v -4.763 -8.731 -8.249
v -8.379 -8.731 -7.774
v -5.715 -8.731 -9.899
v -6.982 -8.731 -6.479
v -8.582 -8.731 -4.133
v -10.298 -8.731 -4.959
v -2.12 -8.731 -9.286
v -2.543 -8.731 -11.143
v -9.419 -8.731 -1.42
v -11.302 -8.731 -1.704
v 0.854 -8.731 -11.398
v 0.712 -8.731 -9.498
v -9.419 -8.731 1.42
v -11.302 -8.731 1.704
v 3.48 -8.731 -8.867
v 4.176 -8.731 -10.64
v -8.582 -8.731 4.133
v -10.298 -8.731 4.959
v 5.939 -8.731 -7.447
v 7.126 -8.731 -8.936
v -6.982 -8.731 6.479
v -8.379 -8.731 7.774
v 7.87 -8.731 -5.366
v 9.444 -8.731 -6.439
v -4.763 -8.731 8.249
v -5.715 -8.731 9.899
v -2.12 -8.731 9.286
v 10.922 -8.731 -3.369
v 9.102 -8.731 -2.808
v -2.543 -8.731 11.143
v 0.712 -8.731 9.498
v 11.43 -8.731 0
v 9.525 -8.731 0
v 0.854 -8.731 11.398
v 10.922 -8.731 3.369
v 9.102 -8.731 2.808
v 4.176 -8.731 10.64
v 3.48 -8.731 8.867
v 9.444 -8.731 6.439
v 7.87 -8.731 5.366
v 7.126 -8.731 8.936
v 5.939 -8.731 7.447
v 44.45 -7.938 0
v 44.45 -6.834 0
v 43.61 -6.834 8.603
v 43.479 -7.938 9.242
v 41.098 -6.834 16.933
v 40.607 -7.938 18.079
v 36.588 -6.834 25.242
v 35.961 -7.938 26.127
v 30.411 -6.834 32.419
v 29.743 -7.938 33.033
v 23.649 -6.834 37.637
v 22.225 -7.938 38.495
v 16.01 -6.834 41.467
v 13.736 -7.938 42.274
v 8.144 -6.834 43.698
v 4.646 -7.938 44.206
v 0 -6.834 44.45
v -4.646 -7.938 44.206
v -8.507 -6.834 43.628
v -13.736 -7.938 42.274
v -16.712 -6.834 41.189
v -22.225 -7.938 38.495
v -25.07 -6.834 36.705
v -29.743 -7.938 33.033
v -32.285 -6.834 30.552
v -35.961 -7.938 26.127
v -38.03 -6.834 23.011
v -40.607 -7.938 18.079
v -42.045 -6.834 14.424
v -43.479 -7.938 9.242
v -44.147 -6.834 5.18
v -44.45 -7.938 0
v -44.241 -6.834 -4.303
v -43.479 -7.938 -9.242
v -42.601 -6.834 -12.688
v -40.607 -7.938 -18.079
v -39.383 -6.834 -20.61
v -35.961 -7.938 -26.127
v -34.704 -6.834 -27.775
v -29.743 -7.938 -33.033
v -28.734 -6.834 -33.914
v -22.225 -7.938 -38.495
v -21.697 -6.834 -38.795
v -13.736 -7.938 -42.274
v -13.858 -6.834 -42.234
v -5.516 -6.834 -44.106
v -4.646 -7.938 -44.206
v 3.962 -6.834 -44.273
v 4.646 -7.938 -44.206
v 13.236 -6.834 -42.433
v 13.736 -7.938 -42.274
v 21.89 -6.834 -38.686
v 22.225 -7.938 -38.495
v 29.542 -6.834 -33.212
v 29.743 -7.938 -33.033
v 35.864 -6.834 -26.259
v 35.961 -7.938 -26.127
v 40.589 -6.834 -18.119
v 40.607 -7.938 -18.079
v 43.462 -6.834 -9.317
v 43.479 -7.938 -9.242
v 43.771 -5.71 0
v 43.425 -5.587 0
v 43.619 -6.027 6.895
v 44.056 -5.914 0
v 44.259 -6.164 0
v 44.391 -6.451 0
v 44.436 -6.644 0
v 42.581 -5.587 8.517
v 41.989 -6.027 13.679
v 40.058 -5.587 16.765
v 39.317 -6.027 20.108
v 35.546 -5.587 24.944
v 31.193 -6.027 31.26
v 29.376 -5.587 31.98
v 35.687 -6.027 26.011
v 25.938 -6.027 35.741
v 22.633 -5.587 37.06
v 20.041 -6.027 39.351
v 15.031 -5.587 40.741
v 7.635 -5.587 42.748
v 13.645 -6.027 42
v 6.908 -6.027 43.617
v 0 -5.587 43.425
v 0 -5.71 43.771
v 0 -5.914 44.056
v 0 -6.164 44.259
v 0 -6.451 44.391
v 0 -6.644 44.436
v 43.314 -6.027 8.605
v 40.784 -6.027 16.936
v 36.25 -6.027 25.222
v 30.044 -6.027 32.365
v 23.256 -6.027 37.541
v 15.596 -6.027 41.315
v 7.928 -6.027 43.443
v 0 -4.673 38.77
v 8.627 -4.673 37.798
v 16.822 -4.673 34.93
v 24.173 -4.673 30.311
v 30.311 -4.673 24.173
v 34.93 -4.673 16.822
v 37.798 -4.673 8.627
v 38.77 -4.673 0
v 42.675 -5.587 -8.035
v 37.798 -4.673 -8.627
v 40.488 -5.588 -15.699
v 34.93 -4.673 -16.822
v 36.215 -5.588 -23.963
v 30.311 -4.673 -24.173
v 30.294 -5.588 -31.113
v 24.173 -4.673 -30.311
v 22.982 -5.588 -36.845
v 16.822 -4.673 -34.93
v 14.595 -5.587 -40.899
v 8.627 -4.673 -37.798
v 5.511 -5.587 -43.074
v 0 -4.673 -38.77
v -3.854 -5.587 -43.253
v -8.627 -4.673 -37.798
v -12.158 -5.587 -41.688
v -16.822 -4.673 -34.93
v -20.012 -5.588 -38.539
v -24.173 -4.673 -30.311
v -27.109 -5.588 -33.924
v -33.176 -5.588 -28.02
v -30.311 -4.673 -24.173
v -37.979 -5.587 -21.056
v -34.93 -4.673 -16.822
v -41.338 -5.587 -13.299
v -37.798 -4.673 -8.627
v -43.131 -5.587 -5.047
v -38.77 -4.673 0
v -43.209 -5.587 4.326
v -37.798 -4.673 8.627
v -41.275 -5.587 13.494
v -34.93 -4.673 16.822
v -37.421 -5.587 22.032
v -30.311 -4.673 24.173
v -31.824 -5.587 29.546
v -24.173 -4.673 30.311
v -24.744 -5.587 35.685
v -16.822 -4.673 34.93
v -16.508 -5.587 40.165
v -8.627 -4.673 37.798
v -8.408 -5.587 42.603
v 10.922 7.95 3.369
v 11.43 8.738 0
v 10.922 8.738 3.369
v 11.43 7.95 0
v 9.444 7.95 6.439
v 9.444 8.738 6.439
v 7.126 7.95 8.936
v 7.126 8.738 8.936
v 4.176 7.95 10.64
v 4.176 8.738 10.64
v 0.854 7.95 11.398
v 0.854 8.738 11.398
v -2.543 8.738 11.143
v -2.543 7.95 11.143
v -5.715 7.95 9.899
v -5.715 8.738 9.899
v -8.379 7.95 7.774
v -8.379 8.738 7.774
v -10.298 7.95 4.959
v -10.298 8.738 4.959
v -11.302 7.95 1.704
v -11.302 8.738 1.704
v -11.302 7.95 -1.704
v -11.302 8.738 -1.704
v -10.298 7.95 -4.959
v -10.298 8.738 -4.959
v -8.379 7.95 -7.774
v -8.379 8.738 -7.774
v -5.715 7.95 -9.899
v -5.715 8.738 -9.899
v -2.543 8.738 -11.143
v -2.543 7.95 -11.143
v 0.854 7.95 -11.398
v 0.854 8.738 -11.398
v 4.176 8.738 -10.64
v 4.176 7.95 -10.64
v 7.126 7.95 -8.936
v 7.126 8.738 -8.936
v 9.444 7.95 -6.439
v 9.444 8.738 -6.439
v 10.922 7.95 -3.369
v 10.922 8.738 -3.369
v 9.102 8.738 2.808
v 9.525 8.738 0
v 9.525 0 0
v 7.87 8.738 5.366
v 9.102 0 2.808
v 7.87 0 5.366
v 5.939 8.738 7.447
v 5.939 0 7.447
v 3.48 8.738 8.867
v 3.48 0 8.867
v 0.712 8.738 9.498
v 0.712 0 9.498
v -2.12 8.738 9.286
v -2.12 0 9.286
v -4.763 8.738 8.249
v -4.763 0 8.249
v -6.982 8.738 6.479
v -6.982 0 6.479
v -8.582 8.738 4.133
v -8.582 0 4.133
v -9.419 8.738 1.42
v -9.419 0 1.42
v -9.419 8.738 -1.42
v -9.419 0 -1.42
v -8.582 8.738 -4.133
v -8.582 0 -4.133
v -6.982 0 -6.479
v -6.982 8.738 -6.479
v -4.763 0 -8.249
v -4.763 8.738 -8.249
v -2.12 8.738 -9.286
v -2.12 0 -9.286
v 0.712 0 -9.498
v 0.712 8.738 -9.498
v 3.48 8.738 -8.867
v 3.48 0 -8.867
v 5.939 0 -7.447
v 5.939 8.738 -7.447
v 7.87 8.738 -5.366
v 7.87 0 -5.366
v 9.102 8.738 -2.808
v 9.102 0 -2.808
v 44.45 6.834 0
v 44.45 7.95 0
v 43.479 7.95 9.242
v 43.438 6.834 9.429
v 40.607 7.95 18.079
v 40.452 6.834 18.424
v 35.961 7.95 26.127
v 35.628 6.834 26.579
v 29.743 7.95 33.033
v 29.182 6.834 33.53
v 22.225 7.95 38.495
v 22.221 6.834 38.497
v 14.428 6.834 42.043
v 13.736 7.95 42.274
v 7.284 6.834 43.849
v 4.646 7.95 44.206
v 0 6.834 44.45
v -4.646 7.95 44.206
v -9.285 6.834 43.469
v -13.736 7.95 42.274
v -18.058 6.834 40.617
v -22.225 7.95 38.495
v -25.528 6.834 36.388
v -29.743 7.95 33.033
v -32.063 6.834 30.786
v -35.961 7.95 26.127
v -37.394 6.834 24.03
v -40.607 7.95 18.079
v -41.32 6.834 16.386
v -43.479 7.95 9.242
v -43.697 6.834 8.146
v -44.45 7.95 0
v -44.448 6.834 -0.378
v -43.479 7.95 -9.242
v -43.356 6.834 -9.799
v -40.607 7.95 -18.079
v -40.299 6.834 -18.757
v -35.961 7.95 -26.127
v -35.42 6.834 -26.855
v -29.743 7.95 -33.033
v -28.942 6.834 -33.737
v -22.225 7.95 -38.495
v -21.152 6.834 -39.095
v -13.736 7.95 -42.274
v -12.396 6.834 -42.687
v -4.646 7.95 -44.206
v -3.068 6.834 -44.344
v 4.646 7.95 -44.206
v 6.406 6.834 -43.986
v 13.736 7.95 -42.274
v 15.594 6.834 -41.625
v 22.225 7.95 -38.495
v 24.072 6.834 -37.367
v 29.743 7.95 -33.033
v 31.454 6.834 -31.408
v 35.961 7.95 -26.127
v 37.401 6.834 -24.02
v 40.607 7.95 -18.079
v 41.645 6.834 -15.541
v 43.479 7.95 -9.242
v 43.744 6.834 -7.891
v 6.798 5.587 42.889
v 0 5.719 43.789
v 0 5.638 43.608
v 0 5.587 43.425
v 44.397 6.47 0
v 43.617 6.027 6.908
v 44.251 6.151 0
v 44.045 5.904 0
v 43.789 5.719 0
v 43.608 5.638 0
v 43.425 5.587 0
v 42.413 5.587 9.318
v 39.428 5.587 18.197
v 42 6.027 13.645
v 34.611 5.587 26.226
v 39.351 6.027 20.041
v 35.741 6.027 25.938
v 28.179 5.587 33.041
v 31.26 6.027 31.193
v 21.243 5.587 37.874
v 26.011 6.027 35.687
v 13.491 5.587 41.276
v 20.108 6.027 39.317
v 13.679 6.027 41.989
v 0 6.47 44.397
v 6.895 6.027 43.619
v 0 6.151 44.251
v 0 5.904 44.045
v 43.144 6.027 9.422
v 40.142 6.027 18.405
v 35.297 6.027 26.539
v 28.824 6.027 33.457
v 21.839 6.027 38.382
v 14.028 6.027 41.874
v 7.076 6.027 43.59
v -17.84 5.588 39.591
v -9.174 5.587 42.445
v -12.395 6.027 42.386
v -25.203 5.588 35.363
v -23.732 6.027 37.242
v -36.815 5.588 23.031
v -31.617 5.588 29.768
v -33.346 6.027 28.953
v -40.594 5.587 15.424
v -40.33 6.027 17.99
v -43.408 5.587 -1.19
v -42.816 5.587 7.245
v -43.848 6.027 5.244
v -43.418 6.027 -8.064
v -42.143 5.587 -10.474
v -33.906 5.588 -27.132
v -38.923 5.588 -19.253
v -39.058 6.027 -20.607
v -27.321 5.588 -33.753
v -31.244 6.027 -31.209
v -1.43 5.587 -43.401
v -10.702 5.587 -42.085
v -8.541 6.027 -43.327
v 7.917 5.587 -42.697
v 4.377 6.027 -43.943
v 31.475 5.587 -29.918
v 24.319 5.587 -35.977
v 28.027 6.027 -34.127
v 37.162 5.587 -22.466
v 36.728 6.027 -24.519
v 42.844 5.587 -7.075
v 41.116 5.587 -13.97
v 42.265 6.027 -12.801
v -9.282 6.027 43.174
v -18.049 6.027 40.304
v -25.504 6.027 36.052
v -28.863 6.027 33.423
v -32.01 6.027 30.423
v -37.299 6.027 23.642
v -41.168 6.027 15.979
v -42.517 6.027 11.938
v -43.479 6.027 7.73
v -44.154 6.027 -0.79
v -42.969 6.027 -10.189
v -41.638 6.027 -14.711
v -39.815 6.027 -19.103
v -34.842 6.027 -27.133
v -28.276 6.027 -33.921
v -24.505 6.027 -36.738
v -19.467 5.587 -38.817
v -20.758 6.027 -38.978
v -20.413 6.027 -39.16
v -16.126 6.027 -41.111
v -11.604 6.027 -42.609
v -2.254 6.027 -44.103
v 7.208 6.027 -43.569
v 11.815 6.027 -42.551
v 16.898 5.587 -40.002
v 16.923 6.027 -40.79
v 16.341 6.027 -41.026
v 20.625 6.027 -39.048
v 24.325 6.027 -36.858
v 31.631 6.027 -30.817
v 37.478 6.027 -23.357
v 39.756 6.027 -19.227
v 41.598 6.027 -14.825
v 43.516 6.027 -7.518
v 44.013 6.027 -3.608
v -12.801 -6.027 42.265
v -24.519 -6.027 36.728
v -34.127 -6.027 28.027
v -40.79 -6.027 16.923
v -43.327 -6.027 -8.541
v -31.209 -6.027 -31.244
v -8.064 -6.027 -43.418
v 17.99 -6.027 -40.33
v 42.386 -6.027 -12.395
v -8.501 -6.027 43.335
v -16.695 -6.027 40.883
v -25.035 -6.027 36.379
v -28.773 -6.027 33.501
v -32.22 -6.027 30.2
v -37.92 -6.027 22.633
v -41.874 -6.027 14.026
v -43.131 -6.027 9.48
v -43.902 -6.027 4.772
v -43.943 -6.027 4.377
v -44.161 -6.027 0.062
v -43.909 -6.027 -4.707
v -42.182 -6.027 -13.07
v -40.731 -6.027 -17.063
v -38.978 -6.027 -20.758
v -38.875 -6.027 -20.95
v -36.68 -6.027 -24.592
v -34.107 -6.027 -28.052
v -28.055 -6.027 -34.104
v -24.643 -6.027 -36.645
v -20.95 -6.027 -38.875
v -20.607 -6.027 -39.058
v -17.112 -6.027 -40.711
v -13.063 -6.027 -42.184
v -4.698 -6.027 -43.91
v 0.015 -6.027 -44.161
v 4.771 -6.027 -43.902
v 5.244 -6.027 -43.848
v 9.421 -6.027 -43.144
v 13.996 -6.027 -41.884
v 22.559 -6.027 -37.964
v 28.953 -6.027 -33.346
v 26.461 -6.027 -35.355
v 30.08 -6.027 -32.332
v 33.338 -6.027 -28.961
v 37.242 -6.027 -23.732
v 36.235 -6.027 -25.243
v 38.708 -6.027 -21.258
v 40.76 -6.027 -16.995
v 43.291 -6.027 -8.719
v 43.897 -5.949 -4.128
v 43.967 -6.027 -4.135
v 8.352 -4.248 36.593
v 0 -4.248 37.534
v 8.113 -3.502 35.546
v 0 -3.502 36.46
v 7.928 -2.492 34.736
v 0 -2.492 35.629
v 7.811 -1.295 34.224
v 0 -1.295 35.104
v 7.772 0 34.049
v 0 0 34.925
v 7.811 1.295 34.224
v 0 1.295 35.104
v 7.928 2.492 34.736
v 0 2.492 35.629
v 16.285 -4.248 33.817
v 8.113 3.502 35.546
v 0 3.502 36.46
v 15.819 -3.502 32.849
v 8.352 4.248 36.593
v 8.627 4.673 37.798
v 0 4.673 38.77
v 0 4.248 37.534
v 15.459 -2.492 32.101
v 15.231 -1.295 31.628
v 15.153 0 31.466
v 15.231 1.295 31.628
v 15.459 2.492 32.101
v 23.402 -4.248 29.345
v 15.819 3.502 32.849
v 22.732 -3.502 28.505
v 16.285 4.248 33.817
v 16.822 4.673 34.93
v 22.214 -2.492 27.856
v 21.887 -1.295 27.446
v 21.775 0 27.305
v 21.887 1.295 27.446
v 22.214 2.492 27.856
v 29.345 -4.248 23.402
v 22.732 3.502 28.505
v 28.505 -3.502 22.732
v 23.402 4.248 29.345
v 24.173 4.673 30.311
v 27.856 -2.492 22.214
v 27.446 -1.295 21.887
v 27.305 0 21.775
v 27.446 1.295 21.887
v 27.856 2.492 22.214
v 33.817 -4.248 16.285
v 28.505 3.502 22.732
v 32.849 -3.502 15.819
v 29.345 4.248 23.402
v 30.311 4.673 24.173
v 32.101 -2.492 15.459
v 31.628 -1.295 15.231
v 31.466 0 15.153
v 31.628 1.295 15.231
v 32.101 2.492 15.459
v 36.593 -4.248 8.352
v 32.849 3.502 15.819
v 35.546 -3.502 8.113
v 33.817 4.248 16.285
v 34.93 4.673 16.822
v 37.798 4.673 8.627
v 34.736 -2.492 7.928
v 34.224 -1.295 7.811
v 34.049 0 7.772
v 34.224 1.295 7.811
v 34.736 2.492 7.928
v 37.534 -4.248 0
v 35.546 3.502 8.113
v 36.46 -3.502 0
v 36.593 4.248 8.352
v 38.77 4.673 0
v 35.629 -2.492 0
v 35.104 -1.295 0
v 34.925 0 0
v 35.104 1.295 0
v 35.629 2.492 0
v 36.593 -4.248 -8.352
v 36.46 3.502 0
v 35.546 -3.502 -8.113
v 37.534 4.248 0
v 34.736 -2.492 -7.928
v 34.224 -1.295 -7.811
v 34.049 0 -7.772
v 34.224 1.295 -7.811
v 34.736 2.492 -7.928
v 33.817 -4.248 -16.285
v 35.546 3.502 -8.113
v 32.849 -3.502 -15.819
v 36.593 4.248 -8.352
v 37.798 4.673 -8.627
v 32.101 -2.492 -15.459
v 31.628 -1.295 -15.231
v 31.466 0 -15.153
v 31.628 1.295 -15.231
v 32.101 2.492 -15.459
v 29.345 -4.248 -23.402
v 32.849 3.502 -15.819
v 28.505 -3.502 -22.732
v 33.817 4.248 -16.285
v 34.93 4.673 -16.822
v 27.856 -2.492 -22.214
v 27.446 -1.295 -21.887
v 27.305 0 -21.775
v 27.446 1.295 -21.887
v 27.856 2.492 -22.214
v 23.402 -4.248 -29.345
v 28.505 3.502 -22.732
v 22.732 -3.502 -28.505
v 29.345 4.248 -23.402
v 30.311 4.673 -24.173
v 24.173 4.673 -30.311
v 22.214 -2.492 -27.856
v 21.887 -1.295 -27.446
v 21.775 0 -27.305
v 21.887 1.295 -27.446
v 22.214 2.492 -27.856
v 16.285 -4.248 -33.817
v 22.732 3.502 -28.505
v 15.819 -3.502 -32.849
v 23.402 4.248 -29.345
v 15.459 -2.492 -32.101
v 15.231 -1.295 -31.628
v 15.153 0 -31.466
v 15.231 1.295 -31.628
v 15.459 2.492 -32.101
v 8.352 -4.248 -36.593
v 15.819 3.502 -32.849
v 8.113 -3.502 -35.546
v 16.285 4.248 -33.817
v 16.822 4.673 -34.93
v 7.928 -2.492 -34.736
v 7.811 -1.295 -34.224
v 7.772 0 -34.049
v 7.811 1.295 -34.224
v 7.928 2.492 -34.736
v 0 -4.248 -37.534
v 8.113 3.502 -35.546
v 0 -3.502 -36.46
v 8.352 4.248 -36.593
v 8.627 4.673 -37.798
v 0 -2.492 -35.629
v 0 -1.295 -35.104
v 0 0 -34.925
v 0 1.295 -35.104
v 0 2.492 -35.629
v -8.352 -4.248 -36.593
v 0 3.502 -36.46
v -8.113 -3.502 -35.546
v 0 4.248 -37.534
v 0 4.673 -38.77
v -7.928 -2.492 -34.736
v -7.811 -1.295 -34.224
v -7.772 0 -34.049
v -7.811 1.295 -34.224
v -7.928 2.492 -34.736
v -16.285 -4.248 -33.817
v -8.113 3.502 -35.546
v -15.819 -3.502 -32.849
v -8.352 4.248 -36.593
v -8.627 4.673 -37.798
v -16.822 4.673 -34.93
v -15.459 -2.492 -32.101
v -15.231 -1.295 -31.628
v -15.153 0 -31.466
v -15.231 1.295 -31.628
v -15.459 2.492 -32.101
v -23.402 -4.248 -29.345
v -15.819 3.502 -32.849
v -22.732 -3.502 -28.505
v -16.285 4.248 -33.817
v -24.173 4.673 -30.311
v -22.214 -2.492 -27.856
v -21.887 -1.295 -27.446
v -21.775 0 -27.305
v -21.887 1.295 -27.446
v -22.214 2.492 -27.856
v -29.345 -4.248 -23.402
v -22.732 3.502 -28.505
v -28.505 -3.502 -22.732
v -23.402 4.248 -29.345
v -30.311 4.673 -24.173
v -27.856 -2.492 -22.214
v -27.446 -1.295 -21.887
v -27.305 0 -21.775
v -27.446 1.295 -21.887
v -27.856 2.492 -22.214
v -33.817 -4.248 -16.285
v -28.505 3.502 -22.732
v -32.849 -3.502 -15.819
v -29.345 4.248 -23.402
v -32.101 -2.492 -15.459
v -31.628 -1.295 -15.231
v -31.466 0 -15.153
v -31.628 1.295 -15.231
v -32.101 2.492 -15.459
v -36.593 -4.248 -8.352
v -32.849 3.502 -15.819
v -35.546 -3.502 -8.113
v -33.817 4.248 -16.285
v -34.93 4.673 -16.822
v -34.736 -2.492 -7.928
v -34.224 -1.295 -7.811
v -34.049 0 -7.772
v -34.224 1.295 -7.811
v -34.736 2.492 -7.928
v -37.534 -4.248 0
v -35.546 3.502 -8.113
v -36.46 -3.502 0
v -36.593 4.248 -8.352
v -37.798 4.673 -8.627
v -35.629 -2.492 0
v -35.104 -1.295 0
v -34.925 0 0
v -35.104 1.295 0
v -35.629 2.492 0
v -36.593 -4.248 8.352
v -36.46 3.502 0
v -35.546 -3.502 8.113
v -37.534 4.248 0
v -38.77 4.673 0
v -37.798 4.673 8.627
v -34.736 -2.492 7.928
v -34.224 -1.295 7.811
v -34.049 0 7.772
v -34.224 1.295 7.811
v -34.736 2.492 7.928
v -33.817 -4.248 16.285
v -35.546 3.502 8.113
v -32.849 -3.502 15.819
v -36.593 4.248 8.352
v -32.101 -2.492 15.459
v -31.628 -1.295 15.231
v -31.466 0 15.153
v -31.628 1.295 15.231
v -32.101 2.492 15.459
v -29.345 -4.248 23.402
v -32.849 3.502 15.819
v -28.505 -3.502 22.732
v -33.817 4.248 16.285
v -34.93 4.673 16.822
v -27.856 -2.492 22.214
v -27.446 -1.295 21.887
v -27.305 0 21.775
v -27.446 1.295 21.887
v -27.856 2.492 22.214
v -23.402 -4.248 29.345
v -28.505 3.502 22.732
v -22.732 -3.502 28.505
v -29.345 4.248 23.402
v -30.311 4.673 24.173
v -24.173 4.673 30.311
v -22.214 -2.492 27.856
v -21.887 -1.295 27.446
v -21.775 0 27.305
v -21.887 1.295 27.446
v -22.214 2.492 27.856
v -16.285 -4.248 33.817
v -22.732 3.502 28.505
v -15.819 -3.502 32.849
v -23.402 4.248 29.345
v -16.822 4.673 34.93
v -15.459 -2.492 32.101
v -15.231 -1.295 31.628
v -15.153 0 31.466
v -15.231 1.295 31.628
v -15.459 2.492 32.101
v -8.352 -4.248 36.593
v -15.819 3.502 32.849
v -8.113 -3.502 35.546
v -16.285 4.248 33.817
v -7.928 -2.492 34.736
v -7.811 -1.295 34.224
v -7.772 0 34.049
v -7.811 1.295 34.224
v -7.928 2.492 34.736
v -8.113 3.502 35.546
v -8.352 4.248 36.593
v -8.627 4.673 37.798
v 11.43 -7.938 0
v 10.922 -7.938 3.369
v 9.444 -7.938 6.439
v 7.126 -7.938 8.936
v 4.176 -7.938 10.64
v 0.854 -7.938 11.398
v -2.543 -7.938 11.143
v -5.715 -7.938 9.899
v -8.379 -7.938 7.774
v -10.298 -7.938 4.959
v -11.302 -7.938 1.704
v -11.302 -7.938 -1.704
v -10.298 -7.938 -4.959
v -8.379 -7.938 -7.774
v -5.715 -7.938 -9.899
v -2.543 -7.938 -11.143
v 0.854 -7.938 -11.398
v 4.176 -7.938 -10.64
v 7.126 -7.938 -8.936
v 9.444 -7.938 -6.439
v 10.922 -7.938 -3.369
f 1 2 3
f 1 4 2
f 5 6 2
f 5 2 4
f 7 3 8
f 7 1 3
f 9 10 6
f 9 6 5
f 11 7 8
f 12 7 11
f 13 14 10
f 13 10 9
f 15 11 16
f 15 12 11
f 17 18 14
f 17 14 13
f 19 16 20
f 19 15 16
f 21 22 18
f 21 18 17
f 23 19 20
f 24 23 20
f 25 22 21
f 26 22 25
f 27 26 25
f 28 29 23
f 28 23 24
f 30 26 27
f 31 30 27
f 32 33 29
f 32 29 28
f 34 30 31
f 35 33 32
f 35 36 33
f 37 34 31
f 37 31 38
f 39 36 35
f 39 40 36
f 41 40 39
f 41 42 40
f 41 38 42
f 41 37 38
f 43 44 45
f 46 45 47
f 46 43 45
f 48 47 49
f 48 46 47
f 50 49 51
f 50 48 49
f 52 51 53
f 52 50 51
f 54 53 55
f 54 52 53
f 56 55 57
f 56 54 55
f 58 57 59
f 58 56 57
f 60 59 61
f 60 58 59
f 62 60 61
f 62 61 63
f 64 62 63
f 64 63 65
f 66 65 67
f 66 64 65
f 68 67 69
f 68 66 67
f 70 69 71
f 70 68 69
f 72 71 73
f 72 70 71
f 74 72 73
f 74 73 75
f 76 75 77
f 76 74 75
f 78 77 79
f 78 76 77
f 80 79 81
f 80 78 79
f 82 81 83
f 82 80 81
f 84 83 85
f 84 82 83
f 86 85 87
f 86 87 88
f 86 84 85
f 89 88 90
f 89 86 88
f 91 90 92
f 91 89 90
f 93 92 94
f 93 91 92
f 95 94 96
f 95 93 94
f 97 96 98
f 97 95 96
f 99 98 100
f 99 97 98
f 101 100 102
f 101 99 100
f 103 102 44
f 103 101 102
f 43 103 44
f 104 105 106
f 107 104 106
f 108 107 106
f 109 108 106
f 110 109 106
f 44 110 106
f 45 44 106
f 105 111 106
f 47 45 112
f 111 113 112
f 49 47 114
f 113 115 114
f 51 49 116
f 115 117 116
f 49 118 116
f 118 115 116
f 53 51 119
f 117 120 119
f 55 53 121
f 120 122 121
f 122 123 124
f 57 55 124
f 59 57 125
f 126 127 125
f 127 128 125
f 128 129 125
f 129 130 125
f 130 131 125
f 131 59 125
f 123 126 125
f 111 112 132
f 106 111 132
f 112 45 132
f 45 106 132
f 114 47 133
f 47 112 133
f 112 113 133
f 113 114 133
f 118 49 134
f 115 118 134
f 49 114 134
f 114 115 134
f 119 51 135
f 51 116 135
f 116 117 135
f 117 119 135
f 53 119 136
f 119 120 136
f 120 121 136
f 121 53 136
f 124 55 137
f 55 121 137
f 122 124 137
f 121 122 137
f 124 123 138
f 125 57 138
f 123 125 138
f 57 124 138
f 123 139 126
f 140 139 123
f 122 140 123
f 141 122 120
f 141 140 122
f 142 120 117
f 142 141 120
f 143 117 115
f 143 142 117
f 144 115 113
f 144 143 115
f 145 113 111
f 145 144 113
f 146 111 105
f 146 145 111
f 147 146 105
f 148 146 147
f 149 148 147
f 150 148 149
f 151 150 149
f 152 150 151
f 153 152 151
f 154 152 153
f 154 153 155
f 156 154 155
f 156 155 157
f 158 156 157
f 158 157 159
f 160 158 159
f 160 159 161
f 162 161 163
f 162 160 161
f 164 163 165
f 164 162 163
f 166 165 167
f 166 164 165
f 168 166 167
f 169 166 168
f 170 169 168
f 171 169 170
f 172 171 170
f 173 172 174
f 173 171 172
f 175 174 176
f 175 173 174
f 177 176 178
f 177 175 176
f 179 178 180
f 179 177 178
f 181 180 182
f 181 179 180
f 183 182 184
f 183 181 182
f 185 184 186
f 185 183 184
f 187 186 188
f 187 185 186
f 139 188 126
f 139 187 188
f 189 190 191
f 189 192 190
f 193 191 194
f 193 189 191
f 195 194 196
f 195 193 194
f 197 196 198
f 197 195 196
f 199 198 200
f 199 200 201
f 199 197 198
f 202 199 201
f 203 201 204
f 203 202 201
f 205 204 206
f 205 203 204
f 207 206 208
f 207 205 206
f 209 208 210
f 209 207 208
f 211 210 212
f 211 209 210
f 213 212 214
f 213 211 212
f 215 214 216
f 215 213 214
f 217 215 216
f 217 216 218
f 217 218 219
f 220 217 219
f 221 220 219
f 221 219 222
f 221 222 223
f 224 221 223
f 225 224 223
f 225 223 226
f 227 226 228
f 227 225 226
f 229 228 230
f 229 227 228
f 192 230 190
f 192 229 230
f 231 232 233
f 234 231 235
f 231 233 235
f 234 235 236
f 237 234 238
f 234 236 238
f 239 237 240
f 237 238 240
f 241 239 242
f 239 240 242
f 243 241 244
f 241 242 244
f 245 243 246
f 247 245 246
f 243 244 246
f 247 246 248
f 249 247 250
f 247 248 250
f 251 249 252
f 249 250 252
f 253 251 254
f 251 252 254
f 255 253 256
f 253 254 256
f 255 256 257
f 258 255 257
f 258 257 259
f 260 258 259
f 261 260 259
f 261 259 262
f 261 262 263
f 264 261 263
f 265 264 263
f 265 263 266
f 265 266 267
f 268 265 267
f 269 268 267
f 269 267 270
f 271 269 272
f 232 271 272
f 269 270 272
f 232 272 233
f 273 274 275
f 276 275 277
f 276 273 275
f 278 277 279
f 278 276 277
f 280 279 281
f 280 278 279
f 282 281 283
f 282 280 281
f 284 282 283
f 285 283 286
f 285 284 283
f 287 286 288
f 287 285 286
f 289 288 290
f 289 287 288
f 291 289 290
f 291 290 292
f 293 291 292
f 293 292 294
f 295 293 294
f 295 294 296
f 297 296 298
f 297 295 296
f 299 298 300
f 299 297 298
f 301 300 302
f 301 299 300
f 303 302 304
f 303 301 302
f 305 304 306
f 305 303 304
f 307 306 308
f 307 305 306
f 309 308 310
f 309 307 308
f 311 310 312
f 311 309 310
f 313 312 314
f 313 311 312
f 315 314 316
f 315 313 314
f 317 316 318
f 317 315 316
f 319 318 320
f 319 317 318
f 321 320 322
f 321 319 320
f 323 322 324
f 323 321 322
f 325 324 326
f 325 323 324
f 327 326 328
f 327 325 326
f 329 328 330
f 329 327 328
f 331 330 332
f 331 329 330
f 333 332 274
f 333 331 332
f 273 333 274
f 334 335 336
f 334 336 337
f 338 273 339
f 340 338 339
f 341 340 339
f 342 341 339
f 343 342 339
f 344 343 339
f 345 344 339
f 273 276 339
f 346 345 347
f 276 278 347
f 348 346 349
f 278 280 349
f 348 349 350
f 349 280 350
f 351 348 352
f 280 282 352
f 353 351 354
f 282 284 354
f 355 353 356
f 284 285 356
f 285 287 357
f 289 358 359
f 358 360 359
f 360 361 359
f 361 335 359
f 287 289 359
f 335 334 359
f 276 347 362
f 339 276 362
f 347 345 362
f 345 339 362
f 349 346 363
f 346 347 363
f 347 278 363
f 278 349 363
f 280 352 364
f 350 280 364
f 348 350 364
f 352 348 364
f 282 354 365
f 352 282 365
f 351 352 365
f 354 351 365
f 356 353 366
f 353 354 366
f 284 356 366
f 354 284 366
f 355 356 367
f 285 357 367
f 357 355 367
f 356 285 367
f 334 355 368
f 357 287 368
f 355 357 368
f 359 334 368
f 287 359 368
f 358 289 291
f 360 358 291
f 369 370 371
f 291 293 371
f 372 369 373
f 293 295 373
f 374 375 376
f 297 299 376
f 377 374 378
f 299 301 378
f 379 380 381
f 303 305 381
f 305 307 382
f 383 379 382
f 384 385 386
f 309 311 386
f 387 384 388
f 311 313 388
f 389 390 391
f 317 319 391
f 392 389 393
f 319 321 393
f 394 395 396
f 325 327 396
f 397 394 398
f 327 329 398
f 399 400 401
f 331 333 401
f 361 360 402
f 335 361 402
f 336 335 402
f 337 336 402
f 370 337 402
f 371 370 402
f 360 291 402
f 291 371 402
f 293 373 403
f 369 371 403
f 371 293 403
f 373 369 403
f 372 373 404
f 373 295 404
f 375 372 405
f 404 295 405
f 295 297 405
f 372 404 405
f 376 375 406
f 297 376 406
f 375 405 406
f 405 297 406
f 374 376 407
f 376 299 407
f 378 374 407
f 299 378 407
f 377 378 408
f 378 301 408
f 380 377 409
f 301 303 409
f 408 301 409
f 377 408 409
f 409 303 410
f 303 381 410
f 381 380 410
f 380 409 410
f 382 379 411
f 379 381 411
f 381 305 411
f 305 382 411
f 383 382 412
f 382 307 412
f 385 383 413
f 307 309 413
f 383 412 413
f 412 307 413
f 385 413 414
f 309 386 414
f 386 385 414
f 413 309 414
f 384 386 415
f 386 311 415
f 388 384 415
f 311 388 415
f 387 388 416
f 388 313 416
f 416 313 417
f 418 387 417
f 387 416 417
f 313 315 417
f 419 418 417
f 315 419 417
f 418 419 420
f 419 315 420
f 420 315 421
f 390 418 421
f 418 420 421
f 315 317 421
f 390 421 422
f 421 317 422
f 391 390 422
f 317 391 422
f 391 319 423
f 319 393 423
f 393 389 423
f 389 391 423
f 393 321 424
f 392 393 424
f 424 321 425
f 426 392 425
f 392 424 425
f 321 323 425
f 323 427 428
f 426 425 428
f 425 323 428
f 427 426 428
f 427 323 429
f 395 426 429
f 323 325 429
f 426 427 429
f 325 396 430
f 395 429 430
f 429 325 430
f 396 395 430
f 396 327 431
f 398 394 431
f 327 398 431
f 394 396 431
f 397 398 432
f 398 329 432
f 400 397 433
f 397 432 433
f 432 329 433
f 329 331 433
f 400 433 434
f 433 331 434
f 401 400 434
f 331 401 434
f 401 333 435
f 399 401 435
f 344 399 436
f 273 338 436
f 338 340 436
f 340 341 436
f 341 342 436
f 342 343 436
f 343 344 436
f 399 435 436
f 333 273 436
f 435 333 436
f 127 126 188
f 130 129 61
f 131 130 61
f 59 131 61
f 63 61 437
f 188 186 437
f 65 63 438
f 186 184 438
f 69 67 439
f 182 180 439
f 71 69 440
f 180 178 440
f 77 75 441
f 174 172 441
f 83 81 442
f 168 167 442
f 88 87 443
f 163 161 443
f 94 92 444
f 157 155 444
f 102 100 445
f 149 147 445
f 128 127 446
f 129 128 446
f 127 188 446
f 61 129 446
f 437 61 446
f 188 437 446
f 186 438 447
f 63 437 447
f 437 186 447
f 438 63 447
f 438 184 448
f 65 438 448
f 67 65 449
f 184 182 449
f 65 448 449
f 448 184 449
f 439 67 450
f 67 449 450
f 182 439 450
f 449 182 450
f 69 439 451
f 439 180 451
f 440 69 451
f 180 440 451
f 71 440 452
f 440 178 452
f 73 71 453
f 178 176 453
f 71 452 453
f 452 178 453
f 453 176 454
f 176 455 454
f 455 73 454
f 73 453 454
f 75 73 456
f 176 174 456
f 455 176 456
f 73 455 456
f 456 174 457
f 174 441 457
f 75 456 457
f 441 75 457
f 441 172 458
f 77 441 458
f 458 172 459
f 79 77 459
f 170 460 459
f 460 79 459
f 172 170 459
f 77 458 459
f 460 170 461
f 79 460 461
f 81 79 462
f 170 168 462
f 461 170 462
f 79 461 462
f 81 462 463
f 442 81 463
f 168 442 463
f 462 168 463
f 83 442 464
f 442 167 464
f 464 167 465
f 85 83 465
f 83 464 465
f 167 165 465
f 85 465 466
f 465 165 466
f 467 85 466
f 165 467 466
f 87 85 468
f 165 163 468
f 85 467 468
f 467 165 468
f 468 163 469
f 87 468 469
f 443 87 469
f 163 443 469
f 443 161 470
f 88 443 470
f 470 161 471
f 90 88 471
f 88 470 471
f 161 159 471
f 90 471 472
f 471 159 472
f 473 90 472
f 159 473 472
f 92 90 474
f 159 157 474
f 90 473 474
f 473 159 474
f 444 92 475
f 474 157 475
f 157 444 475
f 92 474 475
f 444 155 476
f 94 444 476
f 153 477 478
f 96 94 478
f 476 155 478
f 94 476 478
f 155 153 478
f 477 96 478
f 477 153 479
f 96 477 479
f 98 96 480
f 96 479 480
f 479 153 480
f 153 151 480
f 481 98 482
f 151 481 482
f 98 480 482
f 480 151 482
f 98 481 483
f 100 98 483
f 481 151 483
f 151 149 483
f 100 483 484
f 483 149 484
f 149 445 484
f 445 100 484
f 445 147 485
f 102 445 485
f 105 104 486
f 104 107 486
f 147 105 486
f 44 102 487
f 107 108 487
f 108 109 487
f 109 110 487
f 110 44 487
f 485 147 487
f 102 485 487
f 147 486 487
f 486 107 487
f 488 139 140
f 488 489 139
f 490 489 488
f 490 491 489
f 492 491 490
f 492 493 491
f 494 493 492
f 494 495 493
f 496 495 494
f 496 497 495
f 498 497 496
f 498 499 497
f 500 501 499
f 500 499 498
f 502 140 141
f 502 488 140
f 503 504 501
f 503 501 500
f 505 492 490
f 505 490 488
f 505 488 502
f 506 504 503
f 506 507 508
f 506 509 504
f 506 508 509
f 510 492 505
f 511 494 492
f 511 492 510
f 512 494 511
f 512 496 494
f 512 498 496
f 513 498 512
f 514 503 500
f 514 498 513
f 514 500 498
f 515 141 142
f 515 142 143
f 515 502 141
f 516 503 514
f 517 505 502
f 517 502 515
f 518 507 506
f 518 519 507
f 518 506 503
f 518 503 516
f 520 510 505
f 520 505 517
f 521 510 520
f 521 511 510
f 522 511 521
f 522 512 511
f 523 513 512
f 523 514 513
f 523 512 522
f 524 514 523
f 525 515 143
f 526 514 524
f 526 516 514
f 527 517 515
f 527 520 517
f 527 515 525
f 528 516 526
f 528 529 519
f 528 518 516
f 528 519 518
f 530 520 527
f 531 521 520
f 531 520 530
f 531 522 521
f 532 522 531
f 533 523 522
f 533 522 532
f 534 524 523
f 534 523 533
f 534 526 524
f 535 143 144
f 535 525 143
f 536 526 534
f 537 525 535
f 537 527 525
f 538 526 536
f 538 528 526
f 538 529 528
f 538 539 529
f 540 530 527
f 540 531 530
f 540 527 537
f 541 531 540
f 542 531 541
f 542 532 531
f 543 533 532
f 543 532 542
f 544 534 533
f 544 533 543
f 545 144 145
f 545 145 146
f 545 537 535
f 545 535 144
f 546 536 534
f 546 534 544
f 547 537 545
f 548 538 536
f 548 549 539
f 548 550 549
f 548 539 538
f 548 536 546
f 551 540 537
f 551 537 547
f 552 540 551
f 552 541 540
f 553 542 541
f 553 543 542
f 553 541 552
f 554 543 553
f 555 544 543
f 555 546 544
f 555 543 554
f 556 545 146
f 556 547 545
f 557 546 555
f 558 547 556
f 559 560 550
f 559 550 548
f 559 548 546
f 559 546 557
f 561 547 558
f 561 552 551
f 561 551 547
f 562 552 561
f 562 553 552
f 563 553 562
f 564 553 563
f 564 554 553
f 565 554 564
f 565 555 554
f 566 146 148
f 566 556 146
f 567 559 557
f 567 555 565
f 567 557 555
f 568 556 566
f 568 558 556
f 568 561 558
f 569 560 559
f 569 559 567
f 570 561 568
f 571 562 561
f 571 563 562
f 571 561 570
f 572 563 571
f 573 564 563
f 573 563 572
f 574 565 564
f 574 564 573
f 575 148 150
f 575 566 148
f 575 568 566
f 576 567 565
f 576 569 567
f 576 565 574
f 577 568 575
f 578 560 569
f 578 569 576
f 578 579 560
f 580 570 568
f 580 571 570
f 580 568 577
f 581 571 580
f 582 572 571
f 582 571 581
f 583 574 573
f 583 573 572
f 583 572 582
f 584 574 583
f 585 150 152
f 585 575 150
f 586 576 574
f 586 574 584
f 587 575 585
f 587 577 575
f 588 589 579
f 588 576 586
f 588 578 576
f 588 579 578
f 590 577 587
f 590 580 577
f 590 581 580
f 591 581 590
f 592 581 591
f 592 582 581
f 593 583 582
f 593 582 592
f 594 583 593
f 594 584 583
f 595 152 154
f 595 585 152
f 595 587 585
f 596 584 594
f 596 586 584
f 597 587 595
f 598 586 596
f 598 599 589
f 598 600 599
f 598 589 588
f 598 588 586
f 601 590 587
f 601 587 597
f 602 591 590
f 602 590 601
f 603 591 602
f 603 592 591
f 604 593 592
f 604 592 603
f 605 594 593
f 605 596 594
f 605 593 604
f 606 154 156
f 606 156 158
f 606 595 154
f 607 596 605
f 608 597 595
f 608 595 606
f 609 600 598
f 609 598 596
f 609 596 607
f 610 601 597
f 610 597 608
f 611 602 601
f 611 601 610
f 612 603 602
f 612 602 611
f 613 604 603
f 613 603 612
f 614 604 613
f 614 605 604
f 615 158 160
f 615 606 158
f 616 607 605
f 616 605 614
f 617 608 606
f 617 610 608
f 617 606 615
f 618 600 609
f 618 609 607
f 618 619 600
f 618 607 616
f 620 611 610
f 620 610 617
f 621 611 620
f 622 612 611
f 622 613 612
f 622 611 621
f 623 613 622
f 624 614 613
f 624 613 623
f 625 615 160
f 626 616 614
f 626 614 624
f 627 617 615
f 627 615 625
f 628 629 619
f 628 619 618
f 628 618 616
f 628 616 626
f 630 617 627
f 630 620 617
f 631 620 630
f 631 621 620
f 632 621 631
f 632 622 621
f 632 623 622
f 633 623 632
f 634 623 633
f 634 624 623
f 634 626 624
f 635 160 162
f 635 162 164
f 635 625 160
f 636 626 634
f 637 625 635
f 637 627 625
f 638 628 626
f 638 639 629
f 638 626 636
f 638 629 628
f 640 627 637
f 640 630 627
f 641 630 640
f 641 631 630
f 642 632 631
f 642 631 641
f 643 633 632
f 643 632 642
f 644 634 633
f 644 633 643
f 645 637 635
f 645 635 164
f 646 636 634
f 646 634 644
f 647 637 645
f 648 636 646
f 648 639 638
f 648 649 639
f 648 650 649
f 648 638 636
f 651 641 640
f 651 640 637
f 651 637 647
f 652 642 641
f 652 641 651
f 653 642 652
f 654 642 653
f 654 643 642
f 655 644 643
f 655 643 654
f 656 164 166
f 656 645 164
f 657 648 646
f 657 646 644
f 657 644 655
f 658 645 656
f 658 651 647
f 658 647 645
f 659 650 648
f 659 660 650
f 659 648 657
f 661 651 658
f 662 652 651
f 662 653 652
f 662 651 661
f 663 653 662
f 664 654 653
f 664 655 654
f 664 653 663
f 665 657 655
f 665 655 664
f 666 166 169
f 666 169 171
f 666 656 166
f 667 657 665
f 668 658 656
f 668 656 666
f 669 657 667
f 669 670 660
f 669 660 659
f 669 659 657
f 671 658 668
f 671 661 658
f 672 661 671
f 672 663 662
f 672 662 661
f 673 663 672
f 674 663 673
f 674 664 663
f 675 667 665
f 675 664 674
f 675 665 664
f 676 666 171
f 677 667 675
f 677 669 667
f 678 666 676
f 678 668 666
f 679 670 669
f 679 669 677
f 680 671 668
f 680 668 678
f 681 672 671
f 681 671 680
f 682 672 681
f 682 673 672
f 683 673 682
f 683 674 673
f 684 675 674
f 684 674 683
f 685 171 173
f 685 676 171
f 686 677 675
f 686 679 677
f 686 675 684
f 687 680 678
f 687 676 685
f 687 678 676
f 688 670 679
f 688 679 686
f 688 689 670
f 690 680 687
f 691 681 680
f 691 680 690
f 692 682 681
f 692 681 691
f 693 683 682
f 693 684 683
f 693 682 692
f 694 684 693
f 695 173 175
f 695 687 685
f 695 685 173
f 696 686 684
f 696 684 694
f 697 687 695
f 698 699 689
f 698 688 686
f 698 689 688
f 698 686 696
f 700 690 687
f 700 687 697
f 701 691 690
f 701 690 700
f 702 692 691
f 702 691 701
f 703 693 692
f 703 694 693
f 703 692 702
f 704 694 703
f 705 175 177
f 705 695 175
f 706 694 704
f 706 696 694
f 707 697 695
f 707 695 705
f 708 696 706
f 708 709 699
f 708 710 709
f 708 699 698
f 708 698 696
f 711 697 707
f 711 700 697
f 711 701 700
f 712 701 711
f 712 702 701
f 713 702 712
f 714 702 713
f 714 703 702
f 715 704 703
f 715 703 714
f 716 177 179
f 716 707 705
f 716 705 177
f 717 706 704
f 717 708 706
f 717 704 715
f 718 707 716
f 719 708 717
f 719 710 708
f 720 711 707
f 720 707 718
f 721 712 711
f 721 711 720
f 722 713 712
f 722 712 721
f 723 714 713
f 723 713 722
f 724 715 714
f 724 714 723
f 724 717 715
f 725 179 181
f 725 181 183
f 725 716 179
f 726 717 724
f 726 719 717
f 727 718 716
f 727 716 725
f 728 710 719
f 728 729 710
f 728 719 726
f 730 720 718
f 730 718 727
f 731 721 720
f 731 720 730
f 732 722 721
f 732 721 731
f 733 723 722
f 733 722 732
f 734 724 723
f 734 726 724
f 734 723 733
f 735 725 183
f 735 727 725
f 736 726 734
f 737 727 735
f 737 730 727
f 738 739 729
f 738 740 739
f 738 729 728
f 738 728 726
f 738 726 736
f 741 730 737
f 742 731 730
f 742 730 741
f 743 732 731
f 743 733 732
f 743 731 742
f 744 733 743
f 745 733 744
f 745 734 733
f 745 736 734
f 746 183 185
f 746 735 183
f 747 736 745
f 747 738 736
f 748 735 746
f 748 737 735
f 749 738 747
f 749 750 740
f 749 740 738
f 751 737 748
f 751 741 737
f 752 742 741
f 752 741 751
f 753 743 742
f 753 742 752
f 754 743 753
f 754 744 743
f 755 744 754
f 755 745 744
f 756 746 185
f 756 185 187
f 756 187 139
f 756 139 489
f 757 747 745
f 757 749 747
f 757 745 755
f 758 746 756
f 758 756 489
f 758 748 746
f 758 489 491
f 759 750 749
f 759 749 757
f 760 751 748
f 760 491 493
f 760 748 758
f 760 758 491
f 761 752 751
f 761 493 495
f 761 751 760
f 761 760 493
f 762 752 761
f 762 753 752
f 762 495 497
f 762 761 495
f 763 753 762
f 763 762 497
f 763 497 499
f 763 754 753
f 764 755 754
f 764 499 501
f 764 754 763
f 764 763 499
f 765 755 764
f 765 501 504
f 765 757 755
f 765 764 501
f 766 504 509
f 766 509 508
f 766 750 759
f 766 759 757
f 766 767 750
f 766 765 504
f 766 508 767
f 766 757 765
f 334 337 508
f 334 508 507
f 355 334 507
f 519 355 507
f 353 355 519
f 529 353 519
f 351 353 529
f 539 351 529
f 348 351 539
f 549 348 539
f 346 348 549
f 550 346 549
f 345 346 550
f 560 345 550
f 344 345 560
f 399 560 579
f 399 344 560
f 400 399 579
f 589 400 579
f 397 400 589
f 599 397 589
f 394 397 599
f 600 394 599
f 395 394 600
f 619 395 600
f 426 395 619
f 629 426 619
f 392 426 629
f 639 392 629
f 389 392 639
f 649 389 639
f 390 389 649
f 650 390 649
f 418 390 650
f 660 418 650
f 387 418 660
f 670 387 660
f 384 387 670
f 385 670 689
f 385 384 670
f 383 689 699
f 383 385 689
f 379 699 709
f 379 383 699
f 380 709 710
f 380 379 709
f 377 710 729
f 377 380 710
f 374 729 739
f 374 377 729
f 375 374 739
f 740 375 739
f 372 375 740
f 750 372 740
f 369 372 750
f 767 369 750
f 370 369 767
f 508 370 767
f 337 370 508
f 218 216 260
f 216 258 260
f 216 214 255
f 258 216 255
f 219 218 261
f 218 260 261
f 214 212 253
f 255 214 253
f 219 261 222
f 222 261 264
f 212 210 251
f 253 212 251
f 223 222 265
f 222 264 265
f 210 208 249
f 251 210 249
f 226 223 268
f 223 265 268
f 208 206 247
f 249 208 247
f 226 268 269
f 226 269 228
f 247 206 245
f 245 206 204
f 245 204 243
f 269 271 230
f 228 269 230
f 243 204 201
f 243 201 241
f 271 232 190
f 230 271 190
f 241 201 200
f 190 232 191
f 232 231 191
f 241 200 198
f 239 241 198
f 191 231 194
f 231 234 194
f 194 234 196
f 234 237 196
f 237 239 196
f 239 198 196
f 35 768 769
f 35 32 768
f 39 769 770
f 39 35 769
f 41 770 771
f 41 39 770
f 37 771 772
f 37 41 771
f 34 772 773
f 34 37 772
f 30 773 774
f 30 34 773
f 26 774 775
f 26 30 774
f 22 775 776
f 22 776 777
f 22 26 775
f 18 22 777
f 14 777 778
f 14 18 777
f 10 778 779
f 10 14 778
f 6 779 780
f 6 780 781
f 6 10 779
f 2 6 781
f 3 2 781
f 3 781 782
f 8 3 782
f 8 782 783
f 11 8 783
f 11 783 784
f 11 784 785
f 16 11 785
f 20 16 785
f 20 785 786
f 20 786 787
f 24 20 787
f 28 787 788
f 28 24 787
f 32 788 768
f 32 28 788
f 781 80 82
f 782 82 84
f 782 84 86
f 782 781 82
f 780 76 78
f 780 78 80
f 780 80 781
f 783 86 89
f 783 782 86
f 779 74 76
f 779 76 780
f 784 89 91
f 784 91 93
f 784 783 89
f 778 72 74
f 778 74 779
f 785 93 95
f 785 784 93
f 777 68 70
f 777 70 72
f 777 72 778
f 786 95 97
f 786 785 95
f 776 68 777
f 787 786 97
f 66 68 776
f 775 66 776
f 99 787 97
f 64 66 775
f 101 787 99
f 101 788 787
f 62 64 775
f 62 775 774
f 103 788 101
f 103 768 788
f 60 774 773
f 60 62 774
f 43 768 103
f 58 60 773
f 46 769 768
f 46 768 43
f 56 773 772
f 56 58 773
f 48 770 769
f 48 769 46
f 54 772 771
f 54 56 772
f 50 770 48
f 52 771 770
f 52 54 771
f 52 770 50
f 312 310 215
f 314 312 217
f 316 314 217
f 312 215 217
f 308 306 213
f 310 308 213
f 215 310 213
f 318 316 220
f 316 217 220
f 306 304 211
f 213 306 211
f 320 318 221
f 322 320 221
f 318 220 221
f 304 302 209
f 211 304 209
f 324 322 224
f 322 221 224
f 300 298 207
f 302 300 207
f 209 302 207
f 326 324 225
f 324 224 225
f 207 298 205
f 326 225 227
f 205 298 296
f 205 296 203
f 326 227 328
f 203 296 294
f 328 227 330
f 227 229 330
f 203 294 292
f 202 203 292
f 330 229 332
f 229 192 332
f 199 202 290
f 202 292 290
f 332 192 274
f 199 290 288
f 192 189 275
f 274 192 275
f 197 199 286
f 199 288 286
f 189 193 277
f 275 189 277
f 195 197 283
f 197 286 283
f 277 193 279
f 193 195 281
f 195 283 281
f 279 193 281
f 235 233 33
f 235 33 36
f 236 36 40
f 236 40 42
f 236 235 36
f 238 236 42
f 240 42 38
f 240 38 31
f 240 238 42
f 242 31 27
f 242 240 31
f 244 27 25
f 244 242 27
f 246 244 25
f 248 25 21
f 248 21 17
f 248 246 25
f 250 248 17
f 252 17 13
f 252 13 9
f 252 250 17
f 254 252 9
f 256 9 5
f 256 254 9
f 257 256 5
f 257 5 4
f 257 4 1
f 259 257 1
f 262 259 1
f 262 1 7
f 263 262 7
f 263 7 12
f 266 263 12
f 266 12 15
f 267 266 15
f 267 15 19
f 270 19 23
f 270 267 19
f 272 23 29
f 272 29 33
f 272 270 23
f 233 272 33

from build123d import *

# Parameters (mm, degrees)
F0_R          = 11.43
F0_R_2        = 9.525
F1_DEPTH      = 8.73125
F1_DEPTH_BACK = 8.7376
F0_R_3        = 44.45
F2_DEPTH      = 7.9375
F2_DEPTH_BACK = 7.9502
F5_R          = 1.27


with BuildPart() as f1:
    # F0 (on Front) → F1 (new body, two sides)
    with BuildSketch(Plane.XZ) as f1_sk:
        Circle(F0_R)
        Circle(F0_R_2, mode=Mode.SUBTRACT)
    extrude(amount=F1_DEPTH)
    extrude(f1_sk.sketch, amount=-F1_DEPTH_BACK)

    # F0 (on Front) → F2 (join, two sides)
    with BuildSketch(Plane.XZ) as f2_sk:
        Circle(F0_R_3)
        Circle(F0_R, mode=Mode.SUBTRACT)
    extrude(amount=F2_DEPTH)
    extrude(f2_sk.sketch, amount=-F2_DEPTH_BACK)

    # F3 (on Right) → F4 (revolve, cut)
    with BuildSketch(Plane.YZ):
        with BuildLine():
            Line((-6.35, 47.3075), (-4.6732280163, 38.7697058197))
            ThreePointArc((-4.6732280163, 38.7697058197), (0, 34.925), (4.6732280163, 38.7697058197))
            Line((4.6732280163, 38.7697058197), (6.35, 47.3075))
            Line((6.35, 47.3075), (0, 47.3075))
            Line((0, 47.3075), (-6.35, 47.3075))
        make_face()
    revolve(axis=Axis((0, 33.8884852827, 0), (0, 1, 0)), mode=Mode.SUBTRACT)

    # F5
    f5_edges = [f1.edges().sort_by_distance(p)[0] for p in [
        (31.430896, 5.788804, 31.430896),
        (-31.430896, 5.788804, -31.430896),
        (-31.430896, -5.788804, -31.430896),
        (31.430896, -5.788804, 31.430896),
    ]]
    fillet(f5_edges, radius=F5_R)


solid = f1.part
